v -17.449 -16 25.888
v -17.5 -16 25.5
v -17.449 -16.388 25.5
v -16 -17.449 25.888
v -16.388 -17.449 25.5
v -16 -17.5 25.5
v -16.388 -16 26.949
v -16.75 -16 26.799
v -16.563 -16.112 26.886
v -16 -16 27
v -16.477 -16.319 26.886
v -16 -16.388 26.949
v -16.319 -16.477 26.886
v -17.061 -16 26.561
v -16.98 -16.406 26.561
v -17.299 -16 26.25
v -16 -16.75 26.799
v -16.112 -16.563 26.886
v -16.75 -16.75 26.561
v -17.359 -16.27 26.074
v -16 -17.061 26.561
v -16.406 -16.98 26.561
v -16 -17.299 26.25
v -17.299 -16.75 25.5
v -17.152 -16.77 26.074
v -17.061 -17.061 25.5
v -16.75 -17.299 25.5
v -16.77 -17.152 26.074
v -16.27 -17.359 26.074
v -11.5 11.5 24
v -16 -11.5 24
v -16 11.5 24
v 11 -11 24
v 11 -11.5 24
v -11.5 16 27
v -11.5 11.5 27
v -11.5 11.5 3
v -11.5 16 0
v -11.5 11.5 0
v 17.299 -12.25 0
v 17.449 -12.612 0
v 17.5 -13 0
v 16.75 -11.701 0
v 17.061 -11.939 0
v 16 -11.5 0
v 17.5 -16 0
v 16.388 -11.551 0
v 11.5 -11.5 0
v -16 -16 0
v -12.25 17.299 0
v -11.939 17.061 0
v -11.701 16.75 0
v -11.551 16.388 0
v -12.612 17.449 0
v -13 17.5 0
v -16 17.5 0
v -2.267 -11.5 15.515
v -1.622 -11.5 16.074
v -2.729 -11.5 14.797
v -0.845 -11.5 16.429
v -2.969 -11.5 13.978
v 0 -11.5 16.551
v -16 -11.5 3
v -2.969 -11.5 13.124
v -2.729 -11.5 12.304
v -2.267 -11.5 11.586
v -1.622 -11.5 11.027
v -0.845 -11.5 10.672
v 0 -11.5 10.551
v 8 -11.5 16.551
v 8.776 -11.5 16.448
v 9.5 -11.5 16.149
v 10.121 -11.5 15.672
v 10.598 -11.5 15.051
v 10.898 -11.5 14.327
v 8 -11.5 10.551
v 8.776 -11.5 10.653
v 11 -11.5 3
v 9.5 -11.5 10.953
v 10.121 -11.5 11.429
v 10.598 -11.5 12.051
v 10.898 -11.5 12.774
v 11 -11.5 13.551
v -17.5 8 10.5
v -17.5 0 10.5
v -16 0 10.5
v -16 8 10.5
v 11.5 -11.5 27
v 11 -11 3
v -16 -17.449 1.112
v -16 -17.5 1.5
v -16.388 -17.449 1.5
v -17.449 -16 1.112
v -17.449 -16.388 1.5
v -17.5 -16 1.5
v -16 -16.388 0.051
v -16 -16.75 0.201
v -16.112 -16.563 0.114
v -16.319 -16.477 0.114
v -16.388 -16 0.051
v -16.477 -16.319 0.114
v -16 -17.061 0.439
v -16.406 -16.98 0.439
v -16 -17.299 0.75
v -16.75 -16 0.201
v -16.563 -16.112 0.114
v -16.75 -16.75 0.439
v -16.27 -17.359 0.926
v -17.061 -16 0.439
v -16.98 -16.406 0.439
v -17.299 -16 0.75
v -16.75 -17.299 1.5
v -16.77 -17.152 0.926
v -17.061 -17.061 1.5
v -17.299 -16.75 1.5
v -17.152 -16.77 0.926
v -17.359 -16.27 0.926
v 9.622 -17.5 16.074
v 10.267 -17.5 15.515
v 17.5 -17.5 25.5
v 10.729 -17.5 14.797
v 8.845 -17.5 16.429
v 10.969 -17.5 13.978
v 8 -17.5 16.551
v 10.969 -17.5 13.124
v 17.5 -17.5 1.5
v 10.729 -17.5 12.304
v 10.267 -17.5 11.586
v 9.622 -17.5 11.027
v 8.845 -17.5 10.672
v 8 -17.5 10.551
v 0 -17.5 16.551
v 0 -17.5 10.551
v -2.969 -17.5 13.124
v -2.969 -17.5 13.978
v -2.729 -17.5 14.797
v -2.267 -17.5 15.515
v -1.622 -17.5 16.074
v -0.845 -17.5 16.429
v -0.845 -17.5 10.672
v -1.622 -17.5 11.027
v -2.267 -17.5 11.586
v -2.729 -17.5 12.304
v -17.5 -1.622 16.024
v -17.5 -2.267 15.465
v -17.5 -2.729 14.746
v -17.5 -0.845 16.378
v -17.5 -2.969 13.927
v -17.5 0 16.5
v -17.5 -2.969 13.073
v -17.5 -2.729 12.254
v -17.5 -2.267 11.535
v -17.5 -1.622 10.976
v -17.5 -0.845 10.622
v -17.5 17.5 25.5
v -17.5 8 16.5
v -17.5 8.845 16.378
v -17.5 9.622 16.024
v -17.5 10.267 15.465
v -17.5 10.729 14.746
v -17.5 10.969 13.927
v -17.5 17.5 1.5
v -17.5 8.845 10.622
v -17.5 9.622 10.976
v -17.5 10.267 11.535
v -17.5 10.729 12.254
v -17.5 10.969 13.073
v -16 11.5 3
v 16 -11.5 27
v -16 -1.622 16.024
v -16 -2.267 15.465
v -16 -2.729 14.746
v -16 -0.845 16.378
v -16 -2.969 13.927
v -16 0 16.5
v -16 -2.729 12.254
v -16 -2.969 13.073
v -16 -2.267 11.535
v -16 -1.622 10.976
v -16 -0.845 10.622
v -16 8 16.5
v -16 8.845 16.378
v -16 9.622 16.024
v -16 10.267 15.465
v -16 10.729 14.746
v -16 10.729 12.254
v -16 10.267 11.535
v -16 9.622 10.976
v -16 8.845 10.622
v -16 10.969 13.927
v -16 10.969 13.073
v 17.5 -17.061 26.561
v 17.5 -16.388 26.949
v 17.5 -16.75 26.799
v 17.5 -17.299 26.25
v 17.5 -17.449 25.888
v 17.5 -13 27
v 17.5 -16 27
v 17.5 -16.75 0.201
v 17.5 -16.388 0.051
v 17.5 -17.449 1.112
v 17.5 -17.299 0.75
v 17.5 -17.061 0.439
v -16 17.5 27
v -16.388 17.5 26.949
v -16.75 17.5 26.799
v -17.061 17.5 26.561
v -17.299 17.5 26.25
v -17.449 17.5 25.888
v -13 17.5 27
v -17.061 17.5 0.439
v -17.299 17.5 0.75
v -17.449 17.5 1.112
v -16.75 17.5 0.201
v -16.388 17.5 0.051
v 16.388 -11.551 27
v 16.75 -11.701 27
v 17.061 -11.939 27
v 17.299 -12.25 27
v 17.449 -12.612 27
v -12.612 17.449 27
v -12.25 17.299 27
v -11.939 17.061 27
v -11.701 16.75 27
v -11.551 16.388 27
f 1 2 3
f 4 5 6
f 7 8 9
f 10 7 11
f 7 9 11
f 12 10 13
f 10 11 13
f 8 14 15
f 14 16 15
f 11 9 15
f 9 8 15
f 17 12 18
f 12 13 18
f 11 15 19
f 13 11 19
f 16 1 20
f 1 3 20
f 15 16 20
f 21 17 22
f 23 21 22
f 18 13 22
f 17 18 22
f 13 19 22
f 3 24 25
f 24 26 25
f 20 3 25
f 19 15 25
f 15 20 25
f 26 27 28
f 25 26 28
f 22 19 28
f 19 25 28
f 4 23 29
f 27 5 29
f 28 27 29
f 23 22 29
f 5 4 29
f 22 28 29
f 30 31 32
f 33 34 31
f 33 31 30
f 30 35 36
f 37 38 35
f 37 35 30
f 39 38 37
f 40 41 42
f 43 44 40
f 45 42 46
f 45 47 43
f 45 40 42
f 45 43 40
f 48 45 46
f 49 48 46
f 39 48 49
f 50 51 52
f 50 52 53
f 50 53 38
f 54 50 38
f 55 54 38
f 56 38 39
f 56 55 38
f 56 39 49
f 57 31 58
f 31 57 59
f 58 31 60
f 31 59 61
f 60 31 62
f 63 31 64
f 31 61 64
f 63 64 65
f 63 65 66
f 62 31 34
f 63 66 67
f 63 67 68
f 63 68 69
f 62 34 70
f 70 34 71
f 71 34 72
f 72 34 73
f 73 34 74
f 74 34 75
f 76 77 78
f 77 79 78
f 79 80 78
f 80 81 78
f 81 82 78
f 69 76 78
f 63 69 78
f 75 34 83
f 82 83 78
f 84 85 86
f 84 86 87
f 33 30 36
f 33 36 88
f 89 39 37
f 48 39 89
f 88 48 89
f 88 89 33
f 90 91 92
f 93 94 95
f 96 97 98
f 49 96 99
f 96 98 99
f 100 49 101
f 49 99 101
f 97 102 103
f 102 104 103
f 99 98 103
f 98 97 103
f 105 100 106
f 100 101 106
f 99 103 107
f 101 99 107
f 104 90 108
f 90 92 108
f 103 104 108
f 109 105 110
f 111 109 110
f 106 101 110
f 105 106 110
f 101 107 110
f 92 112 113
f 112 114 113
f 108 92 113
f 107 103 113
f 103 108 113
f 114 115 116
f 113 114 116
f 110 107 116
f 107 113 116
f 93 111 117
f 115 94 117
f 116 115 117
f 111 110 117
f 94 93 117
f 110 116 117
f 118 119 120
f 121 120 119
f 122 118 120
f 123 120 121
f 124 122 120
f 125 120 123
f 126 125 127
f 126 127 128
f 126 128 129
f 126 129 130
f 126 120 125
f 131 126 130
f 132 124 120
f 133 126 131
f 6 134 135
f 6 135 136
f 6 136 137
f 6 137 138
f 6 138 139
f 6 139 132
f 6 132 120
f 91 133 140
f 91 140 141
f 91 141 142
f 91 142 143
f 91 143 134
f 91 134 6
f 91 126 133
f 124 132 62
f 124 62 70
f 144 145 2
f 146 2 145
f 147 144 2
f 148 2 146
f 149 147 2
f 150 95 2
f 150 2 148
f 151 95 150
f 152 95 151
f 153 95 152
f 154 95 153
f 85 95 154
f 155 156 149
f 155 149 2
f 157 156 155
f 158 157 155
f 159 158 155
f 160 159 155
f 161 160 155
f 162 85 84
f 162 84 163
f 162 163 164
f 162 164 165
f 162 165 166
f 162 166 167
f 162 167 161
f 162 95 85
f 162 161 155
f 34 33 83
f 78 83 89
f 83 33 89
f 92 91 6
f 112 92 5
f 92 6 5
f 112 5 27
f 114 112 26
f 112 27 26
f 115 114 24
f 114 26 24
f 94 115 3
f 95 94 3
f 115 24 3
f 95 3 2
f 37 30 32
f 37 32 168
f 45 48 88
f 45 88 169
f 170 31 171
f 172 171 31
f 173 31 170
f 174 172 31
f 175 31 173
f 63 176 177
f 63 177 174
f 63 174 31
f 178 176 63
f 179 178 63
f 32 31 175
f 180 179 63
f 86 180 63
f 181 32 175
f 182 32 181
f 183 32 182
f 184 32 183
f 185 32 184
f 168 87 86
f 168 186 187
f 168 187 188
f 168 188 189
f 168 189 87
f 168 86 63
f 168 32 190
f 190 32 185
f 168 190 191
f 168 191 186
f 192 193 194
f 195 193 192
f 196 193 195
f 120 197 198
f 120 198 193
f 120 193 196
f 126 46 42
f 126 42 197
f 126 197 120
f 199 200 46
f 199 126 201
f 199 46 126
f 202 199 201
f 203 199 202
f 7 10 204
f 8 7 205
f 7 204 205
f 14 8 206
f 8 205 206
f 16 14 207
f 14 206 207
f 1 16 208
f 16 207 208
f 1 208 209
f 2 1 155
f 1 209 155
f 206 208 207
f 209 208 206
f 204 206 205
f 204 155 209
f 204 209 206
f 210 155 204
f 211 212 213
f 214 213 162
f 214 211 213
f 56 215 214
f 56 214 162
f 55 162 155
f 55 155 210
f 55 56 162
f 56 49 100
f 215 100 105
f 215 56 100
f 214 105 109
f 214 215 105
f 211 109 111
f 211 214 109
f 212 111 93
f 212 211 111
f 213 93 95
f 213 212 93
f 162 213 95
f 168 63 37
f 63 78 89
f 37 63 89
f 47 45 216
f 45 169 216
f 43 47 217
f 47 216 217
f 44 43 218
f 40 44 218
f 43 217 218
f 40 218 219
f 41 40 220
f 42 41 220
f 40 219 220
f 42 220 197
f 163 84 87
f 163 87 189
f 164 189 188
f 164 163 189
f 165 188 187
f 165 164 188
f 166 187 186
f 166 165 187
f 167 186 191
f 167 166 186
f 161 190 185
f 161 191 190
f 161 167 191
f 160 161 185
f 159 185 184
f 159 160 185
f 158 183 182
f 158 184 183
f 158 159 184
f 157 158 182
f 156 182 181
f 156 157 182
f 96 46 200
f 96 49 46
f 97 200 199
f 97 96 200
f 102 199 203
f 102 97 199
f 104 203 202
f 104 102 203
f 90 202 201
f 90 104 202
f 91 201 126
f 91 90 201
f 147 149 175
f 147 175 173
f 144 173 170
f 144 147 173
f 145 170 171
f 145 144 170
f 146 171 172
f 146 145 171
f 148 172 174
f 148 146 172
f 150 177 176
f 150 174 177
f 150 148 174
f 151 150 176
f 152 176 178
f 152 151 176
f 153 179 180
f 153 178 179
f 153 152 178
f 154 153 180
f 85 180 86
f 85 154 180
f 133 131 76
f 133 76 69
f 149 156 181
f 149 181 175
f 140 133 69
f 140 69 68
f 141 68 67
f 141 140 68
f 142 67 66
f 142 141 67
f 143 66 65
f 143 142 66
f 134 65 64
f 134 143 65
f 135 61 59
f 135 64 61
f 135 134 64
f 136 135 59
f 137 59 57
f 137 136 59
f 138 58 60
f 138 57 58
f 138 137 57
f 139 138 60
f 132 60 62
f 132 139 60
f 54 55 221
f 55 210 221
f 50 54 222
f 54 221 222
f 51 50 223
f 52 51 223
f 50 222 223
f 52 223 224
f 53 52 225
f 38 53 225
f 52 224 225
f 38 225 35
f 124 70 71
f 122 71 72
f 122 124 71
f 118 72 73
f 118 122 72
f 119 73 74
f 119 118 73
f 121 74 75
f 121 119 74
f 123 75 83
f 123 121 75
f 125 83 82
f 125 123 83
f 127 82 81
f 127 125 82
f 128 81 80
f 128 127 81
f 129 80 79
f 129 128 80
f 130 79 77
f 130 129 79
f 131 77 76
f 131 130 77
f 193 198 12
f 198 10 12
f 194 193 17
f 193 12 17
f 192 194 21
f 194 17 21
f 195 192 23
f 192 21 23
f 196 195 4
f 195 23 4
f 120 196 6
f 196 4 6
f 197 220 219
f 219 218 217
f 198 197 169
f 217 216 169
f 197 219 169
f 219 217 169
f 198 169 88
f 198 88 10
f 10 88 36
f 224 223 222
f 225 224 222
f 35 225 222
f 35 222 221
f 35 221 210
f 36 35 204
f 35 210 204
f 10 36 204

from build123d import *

# Parameters (mm, degrees)
EXTRUDE_1_DEPTH     = 27
FILLET_1_R          = 1.5
FILLET_2_R          = 1.5
CUT_EXTRUDE_1_DEPTH = 27
CUT_EXTRUDE_2_DEPTH = 27
SKETCH_5_W          = 21
SKETCH_5_H          = 23
CUT_EXTRUDE_3_DEPTH = 27


with BuildPart() as part:
    # 草图1 → 凸台-拉伸1 (new body)
    with BuildSketch(Plane.XY):
        Polygon((-11.5, 11.5), (11.5, -11.5), (17.5, -11.5), (17.5, -17.5), (-17.5, -17.5), (-17.5, 17.5), (-11.5, 17.5), align=None)
    extrude(amount=EXTRUDE_1_DEPTH)

    # 圆角1
    fillet_1_edges = [part.edges().sort_by_distance(p)[0] for p in [
        (-11.5, 17.5, 13.5),
        (17.5, -11.5, 13.5),
    ]]
    fillet(fillet_1_edges, radius=FILLET_1_R)

    # 圆角2
    fillet_2_edges = [part.edges().sort_by_distance(p)[0] for p in [
        (-17.5, -17.5, 13.5),
        (-17.5, 0, 27),
        (0, -17.5, 27),
        (0, -17.5, 0),
        (-17.5, 0, 0),
    ]]
    fillet(fillet_2_edges, radius=FILLET_2_R)

    # 草图2 → 切除-拉伸1 (cut)
    with BuildSketch(Plane.XZ.offset(17.5)):
        with BuildLine():
            Line((0, 16.550659992), (8, 16.550659992))
            ThreePointArc((8, 16.550659992), (11, 13.550659992), (8, 10.550659992))
            Line((8, 10.550659992), (0, 10.550659992))
            ThreePointArc((0, 10.550659992), (-3, 13.550659992), (0, 16.550659992))
        make_face()
    extrude(amount=-CUT_EXTRUDE_1_DEPTH, mode=Mode.SUBTRACT)

    # 草图3 → 切除-拉伸2 (cut)
    with BuildSketch(Plane.ZY.offset(17.5)):
        with BuildLine():
            Line((10.5, 0), (10.5, 8))
            ThreePointArc((10.5, 8), (13.5, 11), (16.5, 8))
            Line((16.5, 8), (16.5, 0))
            ThreePointArc((16.5, 0), (13.5, -3), (10.5, 0))
        make_face()
    extrude(amount=-CUT_EXTRUDE_2_DEPTH, mode=Mode.SUBTRACT)

    # 草图5 → 切除-拉伸3 (cut)
    with BuildSketch(Plane(origin=(11, 0, 0), x_dir=(0, 0, -1), z_dir=(1, 0, 0))):
        with Locations((-13.5, 0)):
            Rectangle(SKETCH_5_W, SKETCH_5_H)
    extrude(amount=-CUT_EXTRUDE_3_DEPTH, mode=Mode.SUBTRACT)


solid = part.part
